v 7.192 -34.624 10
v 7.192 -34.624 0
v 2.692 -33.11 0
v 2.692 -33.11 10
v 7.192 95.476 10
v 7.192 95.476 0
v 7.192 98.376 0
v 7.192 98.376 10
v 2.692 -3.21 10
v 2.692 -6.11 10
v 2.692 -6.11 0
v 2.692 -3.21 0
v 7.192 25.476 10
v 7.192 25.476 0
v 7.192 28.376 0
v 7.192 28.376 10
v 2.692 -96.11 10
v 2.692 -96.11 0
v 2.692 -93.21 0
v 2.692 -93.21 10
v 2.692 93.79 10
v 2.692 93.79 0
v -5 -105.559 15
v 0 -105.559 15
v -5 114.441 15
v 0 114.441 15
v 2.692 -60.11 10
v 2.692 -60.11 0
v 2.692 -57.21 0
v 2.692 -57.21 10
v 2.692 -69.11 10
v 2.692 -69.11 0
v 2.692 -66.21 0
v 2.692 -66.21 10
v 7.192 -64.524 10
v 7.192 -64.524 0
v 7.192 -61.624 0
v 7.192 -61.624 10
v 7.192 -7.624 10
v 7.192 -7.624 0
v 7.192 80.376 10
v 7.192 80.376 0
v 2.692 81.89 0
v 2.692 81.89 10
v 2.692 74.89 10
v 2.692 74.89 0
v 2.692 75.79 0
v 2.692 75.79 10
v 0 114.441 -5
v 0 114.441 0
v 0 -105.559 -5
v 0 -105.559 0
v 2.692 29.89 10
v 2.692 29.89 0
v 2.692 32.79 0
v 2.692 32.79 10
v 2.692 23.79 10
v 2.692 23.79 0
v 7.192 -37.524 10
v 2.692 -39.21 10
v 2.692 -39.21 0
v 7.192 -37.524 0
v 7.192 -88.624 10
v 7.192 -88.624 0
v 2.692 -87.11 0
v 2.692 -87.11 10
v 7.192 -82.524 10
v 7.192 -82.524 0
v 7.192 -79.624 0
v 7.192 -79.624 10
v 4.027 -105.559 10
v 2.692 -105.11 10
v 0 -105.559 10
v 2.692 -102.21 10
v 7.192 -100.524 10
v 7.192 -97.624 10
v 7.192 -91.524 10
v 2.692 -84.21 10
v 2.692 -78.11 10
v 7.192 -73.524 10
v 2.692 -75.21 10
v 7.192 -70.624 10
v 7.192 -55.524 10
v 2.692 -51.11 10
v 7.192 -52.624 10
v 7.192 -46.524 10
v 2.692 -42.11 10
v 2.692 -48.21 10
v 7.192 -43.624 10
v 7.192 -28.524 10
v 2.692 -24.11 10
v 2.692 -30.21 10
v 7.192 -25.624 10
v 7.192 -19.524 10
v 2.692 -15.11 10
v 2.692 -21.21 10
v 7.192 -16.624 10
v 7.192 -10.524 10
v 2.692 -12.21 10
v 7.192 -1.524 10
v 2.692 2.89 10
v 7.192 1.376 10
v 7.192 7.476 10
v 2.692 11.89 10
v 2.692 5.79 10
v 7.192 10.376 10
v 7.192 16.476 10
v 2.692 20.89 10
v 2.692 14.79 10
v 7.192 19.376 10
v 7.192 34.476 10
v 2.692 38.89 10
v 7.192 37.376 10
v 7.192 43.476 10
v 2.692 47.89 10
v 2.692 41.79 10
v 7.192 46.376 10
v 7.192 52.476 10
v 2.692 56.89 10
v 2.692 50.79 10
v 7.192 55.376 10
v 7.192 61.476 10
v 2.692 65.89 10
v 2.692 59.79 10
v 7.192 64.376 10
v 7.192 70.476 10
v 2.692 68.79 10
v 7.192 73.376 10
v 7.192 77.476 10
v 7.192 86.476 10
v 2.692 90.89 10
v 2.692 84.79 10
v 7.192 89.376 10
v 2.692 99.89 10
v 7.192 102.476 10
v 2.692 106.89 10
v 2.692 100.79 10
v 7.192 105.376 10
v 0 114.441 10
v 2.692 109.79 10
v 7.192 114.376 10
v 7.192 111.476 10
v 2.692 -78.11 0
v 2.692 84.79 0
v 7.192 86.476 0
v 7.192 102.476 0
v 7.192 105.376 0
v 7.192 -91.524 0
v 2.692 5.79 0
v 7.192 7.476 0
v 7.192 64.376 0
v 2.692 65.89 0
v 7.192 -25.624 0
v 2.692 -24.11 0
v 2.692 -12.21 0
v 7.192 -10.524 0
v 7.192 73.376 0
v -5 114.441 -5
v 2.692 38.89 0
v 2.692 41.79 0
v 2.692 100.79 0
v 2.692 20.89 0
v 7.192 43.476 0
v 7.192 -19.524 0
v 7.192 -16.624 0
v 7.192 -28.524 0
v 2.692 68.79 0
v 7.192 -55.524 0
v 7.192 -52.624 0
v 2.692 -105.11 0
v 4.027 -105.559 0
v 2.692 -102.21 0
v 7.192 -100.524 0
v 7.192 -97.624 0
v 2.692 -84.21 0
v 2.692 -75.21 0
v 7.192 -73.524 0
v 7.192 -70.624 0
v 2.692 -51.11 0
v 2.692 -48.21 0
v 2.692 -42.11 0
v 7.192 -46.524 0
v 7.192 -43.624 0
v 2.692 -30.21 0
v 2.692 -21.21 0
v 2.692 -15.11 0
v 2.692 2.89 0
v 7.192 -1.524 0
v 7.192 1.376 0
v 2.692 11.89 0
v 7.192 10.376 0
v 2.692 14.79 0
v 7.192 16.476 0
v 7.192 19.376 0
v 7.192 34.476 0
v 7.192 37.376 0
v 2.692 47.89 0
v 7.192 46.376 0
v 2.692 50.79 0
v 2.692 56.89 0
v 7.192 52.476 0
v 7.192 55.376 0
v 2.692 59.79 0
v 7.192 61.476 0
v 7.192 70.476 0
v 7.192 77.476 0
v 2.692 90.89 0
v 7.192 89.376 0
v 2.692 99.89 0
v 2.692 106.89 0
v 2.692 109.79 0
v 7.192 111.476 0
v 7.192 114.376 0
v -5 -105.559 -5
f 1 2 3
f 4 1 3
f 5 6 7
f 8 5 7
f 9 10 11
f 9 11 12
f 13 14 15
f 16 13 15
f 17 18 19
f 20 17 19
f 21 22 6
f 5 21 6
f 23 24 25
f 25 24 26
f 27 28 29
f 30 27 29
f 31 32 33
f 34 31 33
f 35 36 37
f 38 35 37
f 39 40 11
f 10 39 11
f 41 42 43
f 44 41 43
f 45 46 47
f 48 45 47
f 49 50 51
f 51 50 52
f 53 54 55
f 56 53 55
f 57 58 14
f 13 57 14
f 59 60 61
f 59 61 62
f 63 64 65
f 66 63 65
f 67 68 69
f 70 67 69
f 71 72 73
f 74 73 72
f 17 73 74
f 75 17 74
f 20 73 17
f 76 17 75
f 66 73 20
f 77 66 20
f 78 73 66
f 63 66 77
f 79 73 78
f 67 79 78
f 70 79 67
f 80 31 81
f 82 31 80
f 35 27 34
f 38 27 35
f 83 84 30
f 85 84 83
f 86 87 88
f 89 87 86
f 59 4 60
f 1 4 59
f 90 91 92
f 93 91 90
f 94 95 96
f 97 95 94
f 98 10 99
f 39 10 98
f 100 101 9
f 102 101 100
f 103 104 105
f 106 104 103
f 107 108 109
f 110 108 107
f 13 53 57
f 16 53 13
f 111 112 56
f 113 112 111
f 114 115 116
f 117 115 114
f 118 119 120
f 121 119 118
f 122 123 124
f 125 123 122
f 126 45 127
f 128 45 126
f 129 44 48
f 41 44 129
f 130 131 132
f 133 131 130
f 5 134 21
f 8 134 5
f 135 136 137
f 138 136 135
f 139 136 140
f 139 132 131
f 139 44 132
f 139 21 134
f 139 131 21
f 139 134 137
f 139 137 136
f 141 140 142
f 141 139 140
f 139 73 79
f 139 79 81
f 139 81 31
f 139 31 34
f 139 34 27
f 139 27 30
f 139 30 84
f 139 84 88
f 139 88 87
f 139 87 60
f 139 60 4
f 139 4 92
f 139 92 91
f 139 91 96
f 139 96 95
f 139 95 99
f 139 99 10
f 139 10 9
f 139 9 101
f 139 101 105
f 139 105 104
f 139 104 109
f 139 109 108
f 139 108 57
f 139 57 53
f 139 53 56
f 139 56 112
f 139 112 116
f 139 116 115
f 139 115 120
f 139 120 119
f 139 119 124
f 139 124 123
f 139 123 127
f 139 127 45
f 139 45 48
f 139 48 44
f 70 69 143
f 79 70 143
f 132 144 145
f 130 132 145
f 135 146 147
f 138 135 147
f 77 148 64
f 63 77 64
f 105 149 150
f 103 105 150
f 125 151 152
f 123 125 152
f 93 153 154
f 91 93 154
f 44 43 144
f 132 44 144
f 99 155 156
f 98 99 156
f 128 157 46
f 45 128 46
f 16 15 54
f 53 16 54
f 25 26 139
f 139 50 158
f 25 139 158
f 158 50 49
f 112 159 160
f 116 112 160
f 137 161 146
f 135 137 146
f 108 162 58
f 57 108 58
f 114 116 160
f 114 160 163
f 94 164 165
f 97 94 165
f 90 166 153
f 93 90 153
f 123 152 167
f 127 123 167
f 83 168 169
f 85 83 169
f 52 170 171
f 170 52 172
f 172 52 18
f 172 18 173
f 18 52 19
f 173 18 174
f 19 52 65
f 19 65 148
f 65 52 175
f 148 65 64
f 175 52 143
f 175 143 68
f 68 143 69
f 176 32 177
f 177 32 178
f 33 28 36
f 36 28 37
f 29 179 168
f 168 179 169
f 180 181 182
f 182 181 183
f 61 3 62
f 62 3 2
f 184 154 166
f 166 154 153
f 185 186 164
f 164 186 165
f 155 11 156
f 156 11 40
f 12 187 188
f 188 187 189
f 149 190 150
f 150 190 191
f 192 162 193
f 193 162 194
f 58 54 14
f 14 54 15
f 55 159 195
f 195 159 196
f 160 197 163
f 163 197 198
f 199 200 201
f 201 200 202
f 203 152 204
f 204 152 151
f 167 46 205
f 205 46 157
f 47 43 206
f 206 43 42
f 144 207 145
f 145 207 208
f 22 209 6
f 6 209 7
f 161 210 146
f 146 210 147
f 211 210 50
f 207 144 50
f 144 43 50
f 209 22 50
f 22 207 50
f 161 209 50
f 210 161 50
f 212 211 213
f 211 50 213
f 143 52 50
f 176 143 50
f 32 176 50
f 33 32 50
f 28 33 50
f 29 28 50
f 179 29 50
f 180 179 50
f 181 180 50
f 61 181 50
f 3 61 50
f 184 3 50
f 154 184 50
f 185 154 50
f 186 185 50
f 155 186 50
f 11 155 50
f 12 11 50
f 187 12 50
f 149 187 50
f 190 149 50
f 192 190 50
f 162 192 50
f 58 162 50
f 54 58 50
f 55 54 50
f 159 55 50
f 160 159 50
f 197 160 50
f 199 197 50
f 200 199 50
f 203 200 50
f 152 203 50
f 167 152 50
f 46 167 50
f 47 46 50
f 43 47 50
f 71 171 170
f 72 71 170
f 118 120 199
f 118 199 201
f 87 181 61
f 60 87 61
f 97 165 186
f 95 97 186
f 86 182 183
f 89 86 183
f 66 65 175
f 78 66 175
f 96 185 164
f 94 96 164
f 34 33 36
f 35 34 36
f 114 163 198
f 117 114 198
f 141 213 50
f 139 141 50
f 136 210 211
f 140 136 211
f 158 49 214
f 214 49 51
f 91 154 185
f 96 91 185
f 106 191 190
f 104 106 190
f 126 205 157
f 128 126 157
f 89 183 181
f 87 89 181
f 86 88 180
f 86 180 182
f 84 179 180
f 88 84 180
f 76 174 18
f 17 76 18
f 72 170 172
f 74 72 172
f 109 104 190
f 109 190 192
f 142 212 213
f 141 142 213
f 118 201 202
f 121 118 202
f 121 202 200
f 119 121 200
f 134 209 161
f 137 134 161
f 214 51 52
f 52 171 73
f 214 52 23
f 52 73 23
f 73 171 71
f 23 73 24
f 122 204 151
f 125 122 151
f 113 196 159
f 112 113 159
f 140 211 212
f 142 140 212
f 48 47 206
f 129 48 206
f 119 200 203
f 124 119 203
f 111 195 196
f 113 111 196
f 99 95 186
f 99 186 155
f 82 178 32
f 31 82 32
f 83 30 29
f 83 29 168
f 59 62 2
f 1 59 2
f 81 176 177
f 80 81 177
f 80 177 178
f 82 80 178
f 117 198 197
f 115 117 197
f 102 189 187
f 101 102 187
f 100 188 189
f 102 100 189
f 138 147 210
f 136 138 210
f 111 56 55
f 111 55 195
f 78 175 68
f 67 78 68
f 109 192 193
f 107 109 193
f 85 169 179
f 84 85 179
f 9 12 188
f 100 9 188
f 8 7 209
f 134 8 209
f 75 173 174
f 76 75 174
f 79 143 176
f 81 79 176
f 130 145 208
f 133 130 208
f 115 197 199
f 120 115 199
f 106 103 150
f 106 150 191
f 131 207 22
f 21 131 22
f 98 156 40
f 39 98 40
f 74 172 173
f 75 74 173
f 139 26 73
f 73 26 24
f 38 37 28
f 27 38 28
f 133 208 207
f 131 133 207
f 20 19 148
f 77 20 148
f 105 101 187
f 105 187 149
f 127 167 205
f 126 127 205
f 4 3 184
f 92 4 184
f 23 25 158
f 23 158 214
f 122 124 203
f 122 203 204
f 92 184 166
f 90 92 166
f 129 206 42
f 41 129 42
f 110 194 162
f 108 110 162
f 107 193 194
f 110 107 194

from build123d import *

# Parameters (mm, degrees)
F1_DEPTH = 10
F3_DEPTH = 5


with BuildPart() as f1:
    # F0 (on Top) → F1 (new body)
    with BuildSketch(Plane.XY):
        Polygon((7.192049, 114.375856), (0, 114.440956), (0, -105.559044), (4.02688, -105.559044), (2.692049, -105.109864), (2.692049, -102.209864), (7.192049, -100.524144), (7.192049, -97.624144), (2.692049, -96.109864), (2.692049, -93.209864), (7.192049, -91.524144), (7.192049, -88.624144), (2.692049, -87.109864), (2.692049, -84.209864), (7.192049, -82.524144), (7.192049, -79.624144), (2.692049, -78.109864), (2.692049, -75.209864), (7.192049, -73.524144), (7.192049, -70.624144), (2.692049, -69.109864), (2.692049, -66.209864), (7.192049, -64.524144), (7.192049, -61.624144), (2.692049, -60.109864), (2.692049, -57.209864), (7.192049, -55.524144), (7.192049, -52.624144), (2.692049, -51.109864), (2.692049, -48.209864), (7.192049, -46.524144), (7.192049, -43.624144), (2.692049, -42.109864), (2.692049, -39.209864), (7.192049, -37.524144), (7.192049, -34.624144), (2.692049, -33.109864), (2.692049, -30.209864), (7.192049, -28.524144), (7.192049, -25.624144), (2.692049, -24.109864), (2.692049, -21.209864), (7.192049, -19.524144), (7.192049, -16.624144), (2.692049, -15.109864), (2.692049, -12.209864), (7.192049, -10.524144), (7.192049, -7.624144), (2.692049, -6.109864), (2.692049, -3.209864), (7.192049, -1.524144), (7.192049, 1.375856), (2.692049, 2.890136), (2.692049, 5.790136), (7.192049, 7.475856), (7.192049, 10.375856), (2.692049, 11.890136), (2.692049, 14.790136), (7.192049, 16.475856), (7.192049, 19.375856), (2.692049, 20.890136), (2.692049, 23.790136), (7.192049, 25.475856), (7.192049, 28.375856), (2.692049, 29.890136), (2.692049, 32.790136), (7.192049, 34.475856), (7.192049, 37.375856), (2.692049, 38.890136), (2.692049, 41.790136), (7.192049, 43.475856), (7.192049, 46.375856), (2.692049, 47.890136), (2.692049, 50.790136), (7.192049, 52.475856), (7.192049, 55.375856), (2.692049, 56.890136), (2.692049, 59.790136), (7.192049, 61.475856), (7.192049, 64.375856), (2.692049, 65.890136), (2.692049, 68.790136), (7.192049, 70.475856), (7.192049, 73.375856), (2.692049, 74.890136), (2.692049, 75.790136), (7.192049, 77.475856), (7.192049, 80.375856), (2.692049, 81.890136), (2.692049, 84.790136), (7.192049, 86.475856), (7.192049, 89.375856), (2.692049, 90.890136), (2.692049, 93.790136), (7.192049, 95.475856), (7.192049, 98.375856), (2.692049, 99.890136), (2.692049, 100.790136), (7.192049, 102.475856), (7.192049, 105.375856), (2.692049, 106.890136), (2.692049, 109.790136), (7.192049, 111.475856), align=None)
    extrude(amount=F1_DEPTH)

    # F2 (on face) → F3 (join)
    with BuildSketch(Plane(origin=(0, 0, 0), x_dir=(0, -1, 0), z_dir=(-1, 0, 0))):
        Polygon((-114.440956, 15), (-114.440956, 5), (-114.440956, -5), (105.559044, -5), (105.559044, 5), (105.559044, 15), align=None)
    extrude(amount=F3_DEPTH)


solid = f1.part
